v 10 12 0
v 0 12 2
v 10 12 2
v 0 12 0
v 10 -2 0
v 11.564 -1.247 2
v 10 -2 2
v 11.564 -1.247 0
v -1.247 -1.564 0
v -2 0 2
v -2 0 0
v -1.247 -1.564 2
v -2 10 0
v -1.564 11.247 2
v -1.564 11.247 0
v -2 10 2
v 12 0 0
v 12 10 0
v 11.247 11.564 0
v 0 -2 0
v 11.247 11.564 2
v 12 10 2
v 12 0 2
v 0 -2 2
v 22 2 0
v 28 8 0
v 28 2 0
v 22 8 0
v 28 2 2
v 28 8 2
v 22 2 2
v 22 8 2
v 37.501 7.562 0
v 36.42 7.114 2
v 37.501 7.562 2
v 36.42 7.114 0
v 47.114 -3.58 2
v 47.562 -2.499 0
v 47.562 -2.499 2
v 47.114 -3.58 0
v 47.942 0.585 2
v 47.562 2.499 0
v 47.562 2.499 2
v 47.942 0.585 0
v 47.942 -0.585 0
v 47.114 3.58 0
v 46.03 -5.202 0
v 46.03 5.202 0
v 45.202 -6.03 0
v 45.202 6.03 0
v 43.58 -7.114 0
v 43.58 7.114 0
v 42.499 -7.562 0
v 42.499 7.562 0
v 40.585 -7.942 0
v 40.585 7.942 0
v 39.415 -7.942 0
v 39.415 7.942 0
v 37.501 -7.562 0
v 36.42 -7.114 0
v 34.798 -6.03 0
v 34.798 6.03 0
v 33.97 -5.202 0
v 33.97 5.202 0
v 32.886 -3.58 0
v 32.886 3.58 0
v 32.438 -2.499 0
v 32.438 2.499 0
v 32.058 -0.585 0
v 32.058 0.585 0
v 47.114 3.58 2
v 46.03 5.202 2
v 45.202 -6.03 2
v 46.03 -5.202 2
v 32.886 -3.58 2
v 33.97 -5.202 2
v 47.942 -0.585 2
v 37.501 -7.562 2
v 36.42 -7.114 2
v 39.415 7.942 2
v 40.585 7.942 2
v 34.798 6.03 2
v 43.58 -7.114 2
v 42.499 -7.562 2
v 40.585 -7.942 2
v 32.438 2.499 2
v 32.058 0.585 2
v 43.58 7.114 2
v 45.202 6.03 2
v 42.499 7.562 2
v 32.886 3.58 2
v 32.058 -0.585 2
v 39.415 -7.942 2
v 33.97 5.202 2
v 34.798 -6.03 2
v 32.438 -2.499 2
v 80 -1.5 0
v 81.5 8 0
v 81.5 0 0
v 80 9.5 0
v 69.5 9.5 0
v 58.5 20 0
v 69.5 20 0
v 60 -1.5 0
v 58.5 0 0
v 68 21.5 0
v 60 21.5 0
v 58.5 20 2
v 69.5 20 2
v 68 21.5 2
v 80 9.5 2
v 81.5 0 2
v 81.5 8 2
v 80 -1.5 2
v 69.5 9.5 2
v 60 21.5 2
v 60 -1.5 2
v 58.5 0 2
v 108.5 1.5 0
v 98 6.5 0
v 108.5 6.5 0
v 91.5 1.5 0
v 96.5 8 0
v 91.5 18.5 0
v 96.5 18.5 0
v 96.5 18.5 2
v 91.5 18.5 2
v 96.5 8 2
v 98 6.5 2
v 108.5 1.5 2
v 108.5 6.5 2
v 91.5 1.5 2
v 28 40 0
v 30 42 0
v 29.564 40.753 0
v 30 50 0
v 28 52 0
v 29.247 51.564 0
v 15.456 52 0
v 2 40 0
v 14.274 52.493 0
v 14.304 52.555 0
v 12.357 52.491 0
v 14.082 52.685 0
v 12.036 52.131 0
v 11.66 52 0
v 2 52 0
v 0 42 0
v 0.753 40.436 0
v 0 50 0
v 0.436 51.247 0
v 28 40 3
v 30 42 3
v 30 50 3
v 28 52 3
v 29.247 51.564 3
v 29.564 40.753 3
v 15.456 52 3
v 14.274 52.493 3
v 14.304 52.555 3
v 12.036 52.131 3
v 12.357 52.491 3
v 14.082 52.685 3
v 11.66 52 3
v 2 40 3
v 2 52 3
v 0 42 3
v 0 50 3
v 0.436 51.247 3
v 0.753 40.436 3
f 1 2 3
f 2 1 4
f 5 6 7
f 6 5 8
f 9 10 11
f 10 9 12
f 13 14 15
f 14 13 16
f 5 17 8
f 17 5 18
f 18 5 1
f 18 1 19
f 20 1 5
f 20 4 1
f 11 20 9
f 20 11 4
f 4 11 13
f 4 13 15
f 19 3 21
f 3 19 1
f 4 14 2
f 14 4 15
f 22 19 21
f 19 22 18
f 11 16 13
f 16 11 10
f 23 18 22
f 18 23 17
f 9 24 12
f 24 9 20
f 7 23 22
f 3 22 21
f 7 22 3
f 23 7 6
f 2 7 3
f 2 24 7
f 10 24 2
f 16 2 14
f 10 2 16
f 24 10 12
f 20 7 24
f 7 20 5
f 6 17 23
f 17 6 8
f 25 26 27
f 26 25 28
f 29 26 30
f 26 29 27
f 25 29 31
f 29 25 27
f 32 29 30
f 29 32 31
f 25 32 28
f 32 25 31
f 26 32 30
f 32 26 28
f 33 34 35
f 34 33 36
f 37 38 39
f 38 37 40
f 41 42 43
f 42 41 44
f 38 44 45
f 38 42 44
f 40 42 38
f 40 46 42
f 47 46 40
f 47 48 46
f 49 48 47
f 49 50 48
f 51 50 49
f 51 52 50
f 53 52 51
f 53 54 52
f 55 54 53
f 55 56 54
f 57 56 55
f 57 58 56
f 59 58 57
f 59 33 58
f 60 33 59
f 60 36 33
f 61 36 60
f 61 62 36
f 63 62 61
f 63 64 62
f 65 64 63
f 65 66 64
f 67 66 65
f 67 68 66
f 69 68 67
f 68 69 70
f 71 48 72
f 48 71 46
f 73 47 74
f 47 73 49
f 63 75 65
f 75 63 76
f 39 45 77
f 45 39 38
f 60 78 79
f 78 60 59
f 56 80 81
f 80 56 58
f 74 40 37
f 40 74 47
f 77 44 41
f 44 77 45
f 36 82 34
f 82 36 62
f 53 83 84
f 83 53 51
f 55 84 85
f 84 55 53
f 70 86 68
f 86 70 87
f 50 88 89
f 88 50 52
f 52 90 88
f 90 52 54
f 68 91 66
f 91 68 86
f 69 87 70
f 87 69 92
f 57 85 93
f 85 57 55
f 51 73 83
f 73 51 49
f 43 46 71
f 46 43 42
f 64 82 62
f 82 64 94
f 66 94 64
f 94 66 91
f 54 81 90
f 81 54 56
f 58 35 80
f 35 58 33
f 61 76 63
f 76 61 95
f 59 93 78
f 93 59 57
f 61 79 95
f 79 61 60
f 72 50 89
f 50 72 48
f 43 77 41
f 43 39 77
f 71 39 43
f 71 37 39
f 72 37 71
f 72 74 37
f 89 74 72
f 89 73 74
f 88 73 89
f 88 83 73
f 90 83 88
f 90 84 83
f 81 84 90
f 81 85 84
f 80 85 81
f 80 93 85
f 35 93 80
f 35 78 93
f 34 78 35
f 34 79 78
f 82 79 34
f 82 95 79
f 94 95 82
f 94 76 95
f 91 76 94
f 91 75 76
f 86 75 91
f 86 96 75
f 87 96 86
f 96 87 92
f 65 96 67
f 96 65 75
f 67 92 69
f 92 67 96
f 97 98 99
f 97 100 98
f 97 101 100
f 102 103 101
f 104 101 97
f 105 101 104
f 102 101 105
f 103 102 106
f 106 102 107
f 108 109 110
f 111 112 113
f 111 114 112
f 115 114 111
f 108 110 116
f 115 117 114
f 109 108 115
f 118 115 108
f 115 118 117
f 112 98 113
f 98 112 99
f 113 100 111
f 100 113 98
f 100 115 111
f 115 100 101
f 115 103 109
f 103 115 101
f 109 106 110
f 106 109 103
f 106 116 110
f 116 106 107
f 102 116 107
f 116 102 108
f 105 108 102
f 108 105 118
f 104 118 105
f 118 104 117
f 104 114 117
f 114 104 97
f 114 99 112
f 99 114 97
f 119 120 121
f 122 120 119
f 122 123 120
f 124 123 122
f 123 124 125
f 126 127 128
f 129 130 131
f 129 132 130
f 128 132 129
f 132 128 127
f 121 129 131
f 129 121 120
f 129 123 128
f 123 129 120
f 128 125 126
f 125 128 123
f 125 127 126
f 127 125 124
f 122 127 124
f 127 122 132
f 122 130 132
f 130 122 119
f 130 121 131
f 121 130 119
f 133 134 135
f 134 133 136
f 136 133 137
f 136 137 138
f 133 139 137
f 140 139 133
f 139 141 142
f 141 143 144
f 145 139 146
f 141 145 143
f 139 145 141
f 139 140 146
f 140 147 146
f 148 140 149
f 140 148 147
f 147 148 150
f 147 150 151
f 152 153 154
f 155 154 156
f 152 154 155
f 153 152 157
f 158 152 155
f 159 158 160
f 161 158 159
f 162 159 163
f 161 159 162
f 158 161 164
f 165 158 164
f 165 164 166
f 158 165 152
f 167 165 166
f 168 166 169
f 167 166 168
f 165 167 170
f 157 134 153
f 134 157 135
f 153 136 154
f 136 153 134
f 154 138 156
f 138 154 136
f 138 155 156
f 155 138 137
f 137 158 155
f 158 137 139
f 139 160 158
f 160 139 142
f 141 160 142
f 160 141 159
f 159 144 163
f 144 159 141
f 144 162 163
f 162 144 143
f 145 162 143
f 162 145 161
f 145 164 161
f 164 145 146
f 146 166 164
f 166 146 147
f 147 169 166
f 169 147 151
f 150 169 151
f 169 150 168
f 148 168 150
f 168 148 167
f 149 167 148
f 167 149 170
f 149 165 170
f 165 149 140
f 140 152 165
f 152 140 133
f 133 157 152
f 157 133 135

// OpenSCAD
// Zweck: offset(r) – rounding outwards and inwards at convex and concave corners, circle, polygon.
module l_form() polygon([[0, 0], [20, 0], [20, 8], [8, 8], [8, 20], [0, 20]]);

linear_extrude(2) offset(r = 2) square(10);                     // outwards: corners become arcs
translate([20, 0, 0]) linear_extrude(2) offset(r = -2) square(10);  // inwards: corners stay sharp
translate([40, 0, 0]) linear_extrude(2) offset(3) circle(r = 5);    // positional = r
translate([60, 0, 0]) linear_extrude(2) offset(r = 1.5) l_form();   // concave corner stays sharp
translate([90, 0, 0]) linear_extrude(2) offset(r = -1.5) l_form();  // concave corner becomes round
// Opening (first inwards, then outwards): sharp corners become round, thin webs vanish
translate([0, 40, 0]) linear_extrude(3) offset(r = 2) offset(r = -2) union() {
    square([30, 12]);
    translate([12, 0]) square([3, 30]);
    translate([0, 20]) square([1.5, 10]);
}
